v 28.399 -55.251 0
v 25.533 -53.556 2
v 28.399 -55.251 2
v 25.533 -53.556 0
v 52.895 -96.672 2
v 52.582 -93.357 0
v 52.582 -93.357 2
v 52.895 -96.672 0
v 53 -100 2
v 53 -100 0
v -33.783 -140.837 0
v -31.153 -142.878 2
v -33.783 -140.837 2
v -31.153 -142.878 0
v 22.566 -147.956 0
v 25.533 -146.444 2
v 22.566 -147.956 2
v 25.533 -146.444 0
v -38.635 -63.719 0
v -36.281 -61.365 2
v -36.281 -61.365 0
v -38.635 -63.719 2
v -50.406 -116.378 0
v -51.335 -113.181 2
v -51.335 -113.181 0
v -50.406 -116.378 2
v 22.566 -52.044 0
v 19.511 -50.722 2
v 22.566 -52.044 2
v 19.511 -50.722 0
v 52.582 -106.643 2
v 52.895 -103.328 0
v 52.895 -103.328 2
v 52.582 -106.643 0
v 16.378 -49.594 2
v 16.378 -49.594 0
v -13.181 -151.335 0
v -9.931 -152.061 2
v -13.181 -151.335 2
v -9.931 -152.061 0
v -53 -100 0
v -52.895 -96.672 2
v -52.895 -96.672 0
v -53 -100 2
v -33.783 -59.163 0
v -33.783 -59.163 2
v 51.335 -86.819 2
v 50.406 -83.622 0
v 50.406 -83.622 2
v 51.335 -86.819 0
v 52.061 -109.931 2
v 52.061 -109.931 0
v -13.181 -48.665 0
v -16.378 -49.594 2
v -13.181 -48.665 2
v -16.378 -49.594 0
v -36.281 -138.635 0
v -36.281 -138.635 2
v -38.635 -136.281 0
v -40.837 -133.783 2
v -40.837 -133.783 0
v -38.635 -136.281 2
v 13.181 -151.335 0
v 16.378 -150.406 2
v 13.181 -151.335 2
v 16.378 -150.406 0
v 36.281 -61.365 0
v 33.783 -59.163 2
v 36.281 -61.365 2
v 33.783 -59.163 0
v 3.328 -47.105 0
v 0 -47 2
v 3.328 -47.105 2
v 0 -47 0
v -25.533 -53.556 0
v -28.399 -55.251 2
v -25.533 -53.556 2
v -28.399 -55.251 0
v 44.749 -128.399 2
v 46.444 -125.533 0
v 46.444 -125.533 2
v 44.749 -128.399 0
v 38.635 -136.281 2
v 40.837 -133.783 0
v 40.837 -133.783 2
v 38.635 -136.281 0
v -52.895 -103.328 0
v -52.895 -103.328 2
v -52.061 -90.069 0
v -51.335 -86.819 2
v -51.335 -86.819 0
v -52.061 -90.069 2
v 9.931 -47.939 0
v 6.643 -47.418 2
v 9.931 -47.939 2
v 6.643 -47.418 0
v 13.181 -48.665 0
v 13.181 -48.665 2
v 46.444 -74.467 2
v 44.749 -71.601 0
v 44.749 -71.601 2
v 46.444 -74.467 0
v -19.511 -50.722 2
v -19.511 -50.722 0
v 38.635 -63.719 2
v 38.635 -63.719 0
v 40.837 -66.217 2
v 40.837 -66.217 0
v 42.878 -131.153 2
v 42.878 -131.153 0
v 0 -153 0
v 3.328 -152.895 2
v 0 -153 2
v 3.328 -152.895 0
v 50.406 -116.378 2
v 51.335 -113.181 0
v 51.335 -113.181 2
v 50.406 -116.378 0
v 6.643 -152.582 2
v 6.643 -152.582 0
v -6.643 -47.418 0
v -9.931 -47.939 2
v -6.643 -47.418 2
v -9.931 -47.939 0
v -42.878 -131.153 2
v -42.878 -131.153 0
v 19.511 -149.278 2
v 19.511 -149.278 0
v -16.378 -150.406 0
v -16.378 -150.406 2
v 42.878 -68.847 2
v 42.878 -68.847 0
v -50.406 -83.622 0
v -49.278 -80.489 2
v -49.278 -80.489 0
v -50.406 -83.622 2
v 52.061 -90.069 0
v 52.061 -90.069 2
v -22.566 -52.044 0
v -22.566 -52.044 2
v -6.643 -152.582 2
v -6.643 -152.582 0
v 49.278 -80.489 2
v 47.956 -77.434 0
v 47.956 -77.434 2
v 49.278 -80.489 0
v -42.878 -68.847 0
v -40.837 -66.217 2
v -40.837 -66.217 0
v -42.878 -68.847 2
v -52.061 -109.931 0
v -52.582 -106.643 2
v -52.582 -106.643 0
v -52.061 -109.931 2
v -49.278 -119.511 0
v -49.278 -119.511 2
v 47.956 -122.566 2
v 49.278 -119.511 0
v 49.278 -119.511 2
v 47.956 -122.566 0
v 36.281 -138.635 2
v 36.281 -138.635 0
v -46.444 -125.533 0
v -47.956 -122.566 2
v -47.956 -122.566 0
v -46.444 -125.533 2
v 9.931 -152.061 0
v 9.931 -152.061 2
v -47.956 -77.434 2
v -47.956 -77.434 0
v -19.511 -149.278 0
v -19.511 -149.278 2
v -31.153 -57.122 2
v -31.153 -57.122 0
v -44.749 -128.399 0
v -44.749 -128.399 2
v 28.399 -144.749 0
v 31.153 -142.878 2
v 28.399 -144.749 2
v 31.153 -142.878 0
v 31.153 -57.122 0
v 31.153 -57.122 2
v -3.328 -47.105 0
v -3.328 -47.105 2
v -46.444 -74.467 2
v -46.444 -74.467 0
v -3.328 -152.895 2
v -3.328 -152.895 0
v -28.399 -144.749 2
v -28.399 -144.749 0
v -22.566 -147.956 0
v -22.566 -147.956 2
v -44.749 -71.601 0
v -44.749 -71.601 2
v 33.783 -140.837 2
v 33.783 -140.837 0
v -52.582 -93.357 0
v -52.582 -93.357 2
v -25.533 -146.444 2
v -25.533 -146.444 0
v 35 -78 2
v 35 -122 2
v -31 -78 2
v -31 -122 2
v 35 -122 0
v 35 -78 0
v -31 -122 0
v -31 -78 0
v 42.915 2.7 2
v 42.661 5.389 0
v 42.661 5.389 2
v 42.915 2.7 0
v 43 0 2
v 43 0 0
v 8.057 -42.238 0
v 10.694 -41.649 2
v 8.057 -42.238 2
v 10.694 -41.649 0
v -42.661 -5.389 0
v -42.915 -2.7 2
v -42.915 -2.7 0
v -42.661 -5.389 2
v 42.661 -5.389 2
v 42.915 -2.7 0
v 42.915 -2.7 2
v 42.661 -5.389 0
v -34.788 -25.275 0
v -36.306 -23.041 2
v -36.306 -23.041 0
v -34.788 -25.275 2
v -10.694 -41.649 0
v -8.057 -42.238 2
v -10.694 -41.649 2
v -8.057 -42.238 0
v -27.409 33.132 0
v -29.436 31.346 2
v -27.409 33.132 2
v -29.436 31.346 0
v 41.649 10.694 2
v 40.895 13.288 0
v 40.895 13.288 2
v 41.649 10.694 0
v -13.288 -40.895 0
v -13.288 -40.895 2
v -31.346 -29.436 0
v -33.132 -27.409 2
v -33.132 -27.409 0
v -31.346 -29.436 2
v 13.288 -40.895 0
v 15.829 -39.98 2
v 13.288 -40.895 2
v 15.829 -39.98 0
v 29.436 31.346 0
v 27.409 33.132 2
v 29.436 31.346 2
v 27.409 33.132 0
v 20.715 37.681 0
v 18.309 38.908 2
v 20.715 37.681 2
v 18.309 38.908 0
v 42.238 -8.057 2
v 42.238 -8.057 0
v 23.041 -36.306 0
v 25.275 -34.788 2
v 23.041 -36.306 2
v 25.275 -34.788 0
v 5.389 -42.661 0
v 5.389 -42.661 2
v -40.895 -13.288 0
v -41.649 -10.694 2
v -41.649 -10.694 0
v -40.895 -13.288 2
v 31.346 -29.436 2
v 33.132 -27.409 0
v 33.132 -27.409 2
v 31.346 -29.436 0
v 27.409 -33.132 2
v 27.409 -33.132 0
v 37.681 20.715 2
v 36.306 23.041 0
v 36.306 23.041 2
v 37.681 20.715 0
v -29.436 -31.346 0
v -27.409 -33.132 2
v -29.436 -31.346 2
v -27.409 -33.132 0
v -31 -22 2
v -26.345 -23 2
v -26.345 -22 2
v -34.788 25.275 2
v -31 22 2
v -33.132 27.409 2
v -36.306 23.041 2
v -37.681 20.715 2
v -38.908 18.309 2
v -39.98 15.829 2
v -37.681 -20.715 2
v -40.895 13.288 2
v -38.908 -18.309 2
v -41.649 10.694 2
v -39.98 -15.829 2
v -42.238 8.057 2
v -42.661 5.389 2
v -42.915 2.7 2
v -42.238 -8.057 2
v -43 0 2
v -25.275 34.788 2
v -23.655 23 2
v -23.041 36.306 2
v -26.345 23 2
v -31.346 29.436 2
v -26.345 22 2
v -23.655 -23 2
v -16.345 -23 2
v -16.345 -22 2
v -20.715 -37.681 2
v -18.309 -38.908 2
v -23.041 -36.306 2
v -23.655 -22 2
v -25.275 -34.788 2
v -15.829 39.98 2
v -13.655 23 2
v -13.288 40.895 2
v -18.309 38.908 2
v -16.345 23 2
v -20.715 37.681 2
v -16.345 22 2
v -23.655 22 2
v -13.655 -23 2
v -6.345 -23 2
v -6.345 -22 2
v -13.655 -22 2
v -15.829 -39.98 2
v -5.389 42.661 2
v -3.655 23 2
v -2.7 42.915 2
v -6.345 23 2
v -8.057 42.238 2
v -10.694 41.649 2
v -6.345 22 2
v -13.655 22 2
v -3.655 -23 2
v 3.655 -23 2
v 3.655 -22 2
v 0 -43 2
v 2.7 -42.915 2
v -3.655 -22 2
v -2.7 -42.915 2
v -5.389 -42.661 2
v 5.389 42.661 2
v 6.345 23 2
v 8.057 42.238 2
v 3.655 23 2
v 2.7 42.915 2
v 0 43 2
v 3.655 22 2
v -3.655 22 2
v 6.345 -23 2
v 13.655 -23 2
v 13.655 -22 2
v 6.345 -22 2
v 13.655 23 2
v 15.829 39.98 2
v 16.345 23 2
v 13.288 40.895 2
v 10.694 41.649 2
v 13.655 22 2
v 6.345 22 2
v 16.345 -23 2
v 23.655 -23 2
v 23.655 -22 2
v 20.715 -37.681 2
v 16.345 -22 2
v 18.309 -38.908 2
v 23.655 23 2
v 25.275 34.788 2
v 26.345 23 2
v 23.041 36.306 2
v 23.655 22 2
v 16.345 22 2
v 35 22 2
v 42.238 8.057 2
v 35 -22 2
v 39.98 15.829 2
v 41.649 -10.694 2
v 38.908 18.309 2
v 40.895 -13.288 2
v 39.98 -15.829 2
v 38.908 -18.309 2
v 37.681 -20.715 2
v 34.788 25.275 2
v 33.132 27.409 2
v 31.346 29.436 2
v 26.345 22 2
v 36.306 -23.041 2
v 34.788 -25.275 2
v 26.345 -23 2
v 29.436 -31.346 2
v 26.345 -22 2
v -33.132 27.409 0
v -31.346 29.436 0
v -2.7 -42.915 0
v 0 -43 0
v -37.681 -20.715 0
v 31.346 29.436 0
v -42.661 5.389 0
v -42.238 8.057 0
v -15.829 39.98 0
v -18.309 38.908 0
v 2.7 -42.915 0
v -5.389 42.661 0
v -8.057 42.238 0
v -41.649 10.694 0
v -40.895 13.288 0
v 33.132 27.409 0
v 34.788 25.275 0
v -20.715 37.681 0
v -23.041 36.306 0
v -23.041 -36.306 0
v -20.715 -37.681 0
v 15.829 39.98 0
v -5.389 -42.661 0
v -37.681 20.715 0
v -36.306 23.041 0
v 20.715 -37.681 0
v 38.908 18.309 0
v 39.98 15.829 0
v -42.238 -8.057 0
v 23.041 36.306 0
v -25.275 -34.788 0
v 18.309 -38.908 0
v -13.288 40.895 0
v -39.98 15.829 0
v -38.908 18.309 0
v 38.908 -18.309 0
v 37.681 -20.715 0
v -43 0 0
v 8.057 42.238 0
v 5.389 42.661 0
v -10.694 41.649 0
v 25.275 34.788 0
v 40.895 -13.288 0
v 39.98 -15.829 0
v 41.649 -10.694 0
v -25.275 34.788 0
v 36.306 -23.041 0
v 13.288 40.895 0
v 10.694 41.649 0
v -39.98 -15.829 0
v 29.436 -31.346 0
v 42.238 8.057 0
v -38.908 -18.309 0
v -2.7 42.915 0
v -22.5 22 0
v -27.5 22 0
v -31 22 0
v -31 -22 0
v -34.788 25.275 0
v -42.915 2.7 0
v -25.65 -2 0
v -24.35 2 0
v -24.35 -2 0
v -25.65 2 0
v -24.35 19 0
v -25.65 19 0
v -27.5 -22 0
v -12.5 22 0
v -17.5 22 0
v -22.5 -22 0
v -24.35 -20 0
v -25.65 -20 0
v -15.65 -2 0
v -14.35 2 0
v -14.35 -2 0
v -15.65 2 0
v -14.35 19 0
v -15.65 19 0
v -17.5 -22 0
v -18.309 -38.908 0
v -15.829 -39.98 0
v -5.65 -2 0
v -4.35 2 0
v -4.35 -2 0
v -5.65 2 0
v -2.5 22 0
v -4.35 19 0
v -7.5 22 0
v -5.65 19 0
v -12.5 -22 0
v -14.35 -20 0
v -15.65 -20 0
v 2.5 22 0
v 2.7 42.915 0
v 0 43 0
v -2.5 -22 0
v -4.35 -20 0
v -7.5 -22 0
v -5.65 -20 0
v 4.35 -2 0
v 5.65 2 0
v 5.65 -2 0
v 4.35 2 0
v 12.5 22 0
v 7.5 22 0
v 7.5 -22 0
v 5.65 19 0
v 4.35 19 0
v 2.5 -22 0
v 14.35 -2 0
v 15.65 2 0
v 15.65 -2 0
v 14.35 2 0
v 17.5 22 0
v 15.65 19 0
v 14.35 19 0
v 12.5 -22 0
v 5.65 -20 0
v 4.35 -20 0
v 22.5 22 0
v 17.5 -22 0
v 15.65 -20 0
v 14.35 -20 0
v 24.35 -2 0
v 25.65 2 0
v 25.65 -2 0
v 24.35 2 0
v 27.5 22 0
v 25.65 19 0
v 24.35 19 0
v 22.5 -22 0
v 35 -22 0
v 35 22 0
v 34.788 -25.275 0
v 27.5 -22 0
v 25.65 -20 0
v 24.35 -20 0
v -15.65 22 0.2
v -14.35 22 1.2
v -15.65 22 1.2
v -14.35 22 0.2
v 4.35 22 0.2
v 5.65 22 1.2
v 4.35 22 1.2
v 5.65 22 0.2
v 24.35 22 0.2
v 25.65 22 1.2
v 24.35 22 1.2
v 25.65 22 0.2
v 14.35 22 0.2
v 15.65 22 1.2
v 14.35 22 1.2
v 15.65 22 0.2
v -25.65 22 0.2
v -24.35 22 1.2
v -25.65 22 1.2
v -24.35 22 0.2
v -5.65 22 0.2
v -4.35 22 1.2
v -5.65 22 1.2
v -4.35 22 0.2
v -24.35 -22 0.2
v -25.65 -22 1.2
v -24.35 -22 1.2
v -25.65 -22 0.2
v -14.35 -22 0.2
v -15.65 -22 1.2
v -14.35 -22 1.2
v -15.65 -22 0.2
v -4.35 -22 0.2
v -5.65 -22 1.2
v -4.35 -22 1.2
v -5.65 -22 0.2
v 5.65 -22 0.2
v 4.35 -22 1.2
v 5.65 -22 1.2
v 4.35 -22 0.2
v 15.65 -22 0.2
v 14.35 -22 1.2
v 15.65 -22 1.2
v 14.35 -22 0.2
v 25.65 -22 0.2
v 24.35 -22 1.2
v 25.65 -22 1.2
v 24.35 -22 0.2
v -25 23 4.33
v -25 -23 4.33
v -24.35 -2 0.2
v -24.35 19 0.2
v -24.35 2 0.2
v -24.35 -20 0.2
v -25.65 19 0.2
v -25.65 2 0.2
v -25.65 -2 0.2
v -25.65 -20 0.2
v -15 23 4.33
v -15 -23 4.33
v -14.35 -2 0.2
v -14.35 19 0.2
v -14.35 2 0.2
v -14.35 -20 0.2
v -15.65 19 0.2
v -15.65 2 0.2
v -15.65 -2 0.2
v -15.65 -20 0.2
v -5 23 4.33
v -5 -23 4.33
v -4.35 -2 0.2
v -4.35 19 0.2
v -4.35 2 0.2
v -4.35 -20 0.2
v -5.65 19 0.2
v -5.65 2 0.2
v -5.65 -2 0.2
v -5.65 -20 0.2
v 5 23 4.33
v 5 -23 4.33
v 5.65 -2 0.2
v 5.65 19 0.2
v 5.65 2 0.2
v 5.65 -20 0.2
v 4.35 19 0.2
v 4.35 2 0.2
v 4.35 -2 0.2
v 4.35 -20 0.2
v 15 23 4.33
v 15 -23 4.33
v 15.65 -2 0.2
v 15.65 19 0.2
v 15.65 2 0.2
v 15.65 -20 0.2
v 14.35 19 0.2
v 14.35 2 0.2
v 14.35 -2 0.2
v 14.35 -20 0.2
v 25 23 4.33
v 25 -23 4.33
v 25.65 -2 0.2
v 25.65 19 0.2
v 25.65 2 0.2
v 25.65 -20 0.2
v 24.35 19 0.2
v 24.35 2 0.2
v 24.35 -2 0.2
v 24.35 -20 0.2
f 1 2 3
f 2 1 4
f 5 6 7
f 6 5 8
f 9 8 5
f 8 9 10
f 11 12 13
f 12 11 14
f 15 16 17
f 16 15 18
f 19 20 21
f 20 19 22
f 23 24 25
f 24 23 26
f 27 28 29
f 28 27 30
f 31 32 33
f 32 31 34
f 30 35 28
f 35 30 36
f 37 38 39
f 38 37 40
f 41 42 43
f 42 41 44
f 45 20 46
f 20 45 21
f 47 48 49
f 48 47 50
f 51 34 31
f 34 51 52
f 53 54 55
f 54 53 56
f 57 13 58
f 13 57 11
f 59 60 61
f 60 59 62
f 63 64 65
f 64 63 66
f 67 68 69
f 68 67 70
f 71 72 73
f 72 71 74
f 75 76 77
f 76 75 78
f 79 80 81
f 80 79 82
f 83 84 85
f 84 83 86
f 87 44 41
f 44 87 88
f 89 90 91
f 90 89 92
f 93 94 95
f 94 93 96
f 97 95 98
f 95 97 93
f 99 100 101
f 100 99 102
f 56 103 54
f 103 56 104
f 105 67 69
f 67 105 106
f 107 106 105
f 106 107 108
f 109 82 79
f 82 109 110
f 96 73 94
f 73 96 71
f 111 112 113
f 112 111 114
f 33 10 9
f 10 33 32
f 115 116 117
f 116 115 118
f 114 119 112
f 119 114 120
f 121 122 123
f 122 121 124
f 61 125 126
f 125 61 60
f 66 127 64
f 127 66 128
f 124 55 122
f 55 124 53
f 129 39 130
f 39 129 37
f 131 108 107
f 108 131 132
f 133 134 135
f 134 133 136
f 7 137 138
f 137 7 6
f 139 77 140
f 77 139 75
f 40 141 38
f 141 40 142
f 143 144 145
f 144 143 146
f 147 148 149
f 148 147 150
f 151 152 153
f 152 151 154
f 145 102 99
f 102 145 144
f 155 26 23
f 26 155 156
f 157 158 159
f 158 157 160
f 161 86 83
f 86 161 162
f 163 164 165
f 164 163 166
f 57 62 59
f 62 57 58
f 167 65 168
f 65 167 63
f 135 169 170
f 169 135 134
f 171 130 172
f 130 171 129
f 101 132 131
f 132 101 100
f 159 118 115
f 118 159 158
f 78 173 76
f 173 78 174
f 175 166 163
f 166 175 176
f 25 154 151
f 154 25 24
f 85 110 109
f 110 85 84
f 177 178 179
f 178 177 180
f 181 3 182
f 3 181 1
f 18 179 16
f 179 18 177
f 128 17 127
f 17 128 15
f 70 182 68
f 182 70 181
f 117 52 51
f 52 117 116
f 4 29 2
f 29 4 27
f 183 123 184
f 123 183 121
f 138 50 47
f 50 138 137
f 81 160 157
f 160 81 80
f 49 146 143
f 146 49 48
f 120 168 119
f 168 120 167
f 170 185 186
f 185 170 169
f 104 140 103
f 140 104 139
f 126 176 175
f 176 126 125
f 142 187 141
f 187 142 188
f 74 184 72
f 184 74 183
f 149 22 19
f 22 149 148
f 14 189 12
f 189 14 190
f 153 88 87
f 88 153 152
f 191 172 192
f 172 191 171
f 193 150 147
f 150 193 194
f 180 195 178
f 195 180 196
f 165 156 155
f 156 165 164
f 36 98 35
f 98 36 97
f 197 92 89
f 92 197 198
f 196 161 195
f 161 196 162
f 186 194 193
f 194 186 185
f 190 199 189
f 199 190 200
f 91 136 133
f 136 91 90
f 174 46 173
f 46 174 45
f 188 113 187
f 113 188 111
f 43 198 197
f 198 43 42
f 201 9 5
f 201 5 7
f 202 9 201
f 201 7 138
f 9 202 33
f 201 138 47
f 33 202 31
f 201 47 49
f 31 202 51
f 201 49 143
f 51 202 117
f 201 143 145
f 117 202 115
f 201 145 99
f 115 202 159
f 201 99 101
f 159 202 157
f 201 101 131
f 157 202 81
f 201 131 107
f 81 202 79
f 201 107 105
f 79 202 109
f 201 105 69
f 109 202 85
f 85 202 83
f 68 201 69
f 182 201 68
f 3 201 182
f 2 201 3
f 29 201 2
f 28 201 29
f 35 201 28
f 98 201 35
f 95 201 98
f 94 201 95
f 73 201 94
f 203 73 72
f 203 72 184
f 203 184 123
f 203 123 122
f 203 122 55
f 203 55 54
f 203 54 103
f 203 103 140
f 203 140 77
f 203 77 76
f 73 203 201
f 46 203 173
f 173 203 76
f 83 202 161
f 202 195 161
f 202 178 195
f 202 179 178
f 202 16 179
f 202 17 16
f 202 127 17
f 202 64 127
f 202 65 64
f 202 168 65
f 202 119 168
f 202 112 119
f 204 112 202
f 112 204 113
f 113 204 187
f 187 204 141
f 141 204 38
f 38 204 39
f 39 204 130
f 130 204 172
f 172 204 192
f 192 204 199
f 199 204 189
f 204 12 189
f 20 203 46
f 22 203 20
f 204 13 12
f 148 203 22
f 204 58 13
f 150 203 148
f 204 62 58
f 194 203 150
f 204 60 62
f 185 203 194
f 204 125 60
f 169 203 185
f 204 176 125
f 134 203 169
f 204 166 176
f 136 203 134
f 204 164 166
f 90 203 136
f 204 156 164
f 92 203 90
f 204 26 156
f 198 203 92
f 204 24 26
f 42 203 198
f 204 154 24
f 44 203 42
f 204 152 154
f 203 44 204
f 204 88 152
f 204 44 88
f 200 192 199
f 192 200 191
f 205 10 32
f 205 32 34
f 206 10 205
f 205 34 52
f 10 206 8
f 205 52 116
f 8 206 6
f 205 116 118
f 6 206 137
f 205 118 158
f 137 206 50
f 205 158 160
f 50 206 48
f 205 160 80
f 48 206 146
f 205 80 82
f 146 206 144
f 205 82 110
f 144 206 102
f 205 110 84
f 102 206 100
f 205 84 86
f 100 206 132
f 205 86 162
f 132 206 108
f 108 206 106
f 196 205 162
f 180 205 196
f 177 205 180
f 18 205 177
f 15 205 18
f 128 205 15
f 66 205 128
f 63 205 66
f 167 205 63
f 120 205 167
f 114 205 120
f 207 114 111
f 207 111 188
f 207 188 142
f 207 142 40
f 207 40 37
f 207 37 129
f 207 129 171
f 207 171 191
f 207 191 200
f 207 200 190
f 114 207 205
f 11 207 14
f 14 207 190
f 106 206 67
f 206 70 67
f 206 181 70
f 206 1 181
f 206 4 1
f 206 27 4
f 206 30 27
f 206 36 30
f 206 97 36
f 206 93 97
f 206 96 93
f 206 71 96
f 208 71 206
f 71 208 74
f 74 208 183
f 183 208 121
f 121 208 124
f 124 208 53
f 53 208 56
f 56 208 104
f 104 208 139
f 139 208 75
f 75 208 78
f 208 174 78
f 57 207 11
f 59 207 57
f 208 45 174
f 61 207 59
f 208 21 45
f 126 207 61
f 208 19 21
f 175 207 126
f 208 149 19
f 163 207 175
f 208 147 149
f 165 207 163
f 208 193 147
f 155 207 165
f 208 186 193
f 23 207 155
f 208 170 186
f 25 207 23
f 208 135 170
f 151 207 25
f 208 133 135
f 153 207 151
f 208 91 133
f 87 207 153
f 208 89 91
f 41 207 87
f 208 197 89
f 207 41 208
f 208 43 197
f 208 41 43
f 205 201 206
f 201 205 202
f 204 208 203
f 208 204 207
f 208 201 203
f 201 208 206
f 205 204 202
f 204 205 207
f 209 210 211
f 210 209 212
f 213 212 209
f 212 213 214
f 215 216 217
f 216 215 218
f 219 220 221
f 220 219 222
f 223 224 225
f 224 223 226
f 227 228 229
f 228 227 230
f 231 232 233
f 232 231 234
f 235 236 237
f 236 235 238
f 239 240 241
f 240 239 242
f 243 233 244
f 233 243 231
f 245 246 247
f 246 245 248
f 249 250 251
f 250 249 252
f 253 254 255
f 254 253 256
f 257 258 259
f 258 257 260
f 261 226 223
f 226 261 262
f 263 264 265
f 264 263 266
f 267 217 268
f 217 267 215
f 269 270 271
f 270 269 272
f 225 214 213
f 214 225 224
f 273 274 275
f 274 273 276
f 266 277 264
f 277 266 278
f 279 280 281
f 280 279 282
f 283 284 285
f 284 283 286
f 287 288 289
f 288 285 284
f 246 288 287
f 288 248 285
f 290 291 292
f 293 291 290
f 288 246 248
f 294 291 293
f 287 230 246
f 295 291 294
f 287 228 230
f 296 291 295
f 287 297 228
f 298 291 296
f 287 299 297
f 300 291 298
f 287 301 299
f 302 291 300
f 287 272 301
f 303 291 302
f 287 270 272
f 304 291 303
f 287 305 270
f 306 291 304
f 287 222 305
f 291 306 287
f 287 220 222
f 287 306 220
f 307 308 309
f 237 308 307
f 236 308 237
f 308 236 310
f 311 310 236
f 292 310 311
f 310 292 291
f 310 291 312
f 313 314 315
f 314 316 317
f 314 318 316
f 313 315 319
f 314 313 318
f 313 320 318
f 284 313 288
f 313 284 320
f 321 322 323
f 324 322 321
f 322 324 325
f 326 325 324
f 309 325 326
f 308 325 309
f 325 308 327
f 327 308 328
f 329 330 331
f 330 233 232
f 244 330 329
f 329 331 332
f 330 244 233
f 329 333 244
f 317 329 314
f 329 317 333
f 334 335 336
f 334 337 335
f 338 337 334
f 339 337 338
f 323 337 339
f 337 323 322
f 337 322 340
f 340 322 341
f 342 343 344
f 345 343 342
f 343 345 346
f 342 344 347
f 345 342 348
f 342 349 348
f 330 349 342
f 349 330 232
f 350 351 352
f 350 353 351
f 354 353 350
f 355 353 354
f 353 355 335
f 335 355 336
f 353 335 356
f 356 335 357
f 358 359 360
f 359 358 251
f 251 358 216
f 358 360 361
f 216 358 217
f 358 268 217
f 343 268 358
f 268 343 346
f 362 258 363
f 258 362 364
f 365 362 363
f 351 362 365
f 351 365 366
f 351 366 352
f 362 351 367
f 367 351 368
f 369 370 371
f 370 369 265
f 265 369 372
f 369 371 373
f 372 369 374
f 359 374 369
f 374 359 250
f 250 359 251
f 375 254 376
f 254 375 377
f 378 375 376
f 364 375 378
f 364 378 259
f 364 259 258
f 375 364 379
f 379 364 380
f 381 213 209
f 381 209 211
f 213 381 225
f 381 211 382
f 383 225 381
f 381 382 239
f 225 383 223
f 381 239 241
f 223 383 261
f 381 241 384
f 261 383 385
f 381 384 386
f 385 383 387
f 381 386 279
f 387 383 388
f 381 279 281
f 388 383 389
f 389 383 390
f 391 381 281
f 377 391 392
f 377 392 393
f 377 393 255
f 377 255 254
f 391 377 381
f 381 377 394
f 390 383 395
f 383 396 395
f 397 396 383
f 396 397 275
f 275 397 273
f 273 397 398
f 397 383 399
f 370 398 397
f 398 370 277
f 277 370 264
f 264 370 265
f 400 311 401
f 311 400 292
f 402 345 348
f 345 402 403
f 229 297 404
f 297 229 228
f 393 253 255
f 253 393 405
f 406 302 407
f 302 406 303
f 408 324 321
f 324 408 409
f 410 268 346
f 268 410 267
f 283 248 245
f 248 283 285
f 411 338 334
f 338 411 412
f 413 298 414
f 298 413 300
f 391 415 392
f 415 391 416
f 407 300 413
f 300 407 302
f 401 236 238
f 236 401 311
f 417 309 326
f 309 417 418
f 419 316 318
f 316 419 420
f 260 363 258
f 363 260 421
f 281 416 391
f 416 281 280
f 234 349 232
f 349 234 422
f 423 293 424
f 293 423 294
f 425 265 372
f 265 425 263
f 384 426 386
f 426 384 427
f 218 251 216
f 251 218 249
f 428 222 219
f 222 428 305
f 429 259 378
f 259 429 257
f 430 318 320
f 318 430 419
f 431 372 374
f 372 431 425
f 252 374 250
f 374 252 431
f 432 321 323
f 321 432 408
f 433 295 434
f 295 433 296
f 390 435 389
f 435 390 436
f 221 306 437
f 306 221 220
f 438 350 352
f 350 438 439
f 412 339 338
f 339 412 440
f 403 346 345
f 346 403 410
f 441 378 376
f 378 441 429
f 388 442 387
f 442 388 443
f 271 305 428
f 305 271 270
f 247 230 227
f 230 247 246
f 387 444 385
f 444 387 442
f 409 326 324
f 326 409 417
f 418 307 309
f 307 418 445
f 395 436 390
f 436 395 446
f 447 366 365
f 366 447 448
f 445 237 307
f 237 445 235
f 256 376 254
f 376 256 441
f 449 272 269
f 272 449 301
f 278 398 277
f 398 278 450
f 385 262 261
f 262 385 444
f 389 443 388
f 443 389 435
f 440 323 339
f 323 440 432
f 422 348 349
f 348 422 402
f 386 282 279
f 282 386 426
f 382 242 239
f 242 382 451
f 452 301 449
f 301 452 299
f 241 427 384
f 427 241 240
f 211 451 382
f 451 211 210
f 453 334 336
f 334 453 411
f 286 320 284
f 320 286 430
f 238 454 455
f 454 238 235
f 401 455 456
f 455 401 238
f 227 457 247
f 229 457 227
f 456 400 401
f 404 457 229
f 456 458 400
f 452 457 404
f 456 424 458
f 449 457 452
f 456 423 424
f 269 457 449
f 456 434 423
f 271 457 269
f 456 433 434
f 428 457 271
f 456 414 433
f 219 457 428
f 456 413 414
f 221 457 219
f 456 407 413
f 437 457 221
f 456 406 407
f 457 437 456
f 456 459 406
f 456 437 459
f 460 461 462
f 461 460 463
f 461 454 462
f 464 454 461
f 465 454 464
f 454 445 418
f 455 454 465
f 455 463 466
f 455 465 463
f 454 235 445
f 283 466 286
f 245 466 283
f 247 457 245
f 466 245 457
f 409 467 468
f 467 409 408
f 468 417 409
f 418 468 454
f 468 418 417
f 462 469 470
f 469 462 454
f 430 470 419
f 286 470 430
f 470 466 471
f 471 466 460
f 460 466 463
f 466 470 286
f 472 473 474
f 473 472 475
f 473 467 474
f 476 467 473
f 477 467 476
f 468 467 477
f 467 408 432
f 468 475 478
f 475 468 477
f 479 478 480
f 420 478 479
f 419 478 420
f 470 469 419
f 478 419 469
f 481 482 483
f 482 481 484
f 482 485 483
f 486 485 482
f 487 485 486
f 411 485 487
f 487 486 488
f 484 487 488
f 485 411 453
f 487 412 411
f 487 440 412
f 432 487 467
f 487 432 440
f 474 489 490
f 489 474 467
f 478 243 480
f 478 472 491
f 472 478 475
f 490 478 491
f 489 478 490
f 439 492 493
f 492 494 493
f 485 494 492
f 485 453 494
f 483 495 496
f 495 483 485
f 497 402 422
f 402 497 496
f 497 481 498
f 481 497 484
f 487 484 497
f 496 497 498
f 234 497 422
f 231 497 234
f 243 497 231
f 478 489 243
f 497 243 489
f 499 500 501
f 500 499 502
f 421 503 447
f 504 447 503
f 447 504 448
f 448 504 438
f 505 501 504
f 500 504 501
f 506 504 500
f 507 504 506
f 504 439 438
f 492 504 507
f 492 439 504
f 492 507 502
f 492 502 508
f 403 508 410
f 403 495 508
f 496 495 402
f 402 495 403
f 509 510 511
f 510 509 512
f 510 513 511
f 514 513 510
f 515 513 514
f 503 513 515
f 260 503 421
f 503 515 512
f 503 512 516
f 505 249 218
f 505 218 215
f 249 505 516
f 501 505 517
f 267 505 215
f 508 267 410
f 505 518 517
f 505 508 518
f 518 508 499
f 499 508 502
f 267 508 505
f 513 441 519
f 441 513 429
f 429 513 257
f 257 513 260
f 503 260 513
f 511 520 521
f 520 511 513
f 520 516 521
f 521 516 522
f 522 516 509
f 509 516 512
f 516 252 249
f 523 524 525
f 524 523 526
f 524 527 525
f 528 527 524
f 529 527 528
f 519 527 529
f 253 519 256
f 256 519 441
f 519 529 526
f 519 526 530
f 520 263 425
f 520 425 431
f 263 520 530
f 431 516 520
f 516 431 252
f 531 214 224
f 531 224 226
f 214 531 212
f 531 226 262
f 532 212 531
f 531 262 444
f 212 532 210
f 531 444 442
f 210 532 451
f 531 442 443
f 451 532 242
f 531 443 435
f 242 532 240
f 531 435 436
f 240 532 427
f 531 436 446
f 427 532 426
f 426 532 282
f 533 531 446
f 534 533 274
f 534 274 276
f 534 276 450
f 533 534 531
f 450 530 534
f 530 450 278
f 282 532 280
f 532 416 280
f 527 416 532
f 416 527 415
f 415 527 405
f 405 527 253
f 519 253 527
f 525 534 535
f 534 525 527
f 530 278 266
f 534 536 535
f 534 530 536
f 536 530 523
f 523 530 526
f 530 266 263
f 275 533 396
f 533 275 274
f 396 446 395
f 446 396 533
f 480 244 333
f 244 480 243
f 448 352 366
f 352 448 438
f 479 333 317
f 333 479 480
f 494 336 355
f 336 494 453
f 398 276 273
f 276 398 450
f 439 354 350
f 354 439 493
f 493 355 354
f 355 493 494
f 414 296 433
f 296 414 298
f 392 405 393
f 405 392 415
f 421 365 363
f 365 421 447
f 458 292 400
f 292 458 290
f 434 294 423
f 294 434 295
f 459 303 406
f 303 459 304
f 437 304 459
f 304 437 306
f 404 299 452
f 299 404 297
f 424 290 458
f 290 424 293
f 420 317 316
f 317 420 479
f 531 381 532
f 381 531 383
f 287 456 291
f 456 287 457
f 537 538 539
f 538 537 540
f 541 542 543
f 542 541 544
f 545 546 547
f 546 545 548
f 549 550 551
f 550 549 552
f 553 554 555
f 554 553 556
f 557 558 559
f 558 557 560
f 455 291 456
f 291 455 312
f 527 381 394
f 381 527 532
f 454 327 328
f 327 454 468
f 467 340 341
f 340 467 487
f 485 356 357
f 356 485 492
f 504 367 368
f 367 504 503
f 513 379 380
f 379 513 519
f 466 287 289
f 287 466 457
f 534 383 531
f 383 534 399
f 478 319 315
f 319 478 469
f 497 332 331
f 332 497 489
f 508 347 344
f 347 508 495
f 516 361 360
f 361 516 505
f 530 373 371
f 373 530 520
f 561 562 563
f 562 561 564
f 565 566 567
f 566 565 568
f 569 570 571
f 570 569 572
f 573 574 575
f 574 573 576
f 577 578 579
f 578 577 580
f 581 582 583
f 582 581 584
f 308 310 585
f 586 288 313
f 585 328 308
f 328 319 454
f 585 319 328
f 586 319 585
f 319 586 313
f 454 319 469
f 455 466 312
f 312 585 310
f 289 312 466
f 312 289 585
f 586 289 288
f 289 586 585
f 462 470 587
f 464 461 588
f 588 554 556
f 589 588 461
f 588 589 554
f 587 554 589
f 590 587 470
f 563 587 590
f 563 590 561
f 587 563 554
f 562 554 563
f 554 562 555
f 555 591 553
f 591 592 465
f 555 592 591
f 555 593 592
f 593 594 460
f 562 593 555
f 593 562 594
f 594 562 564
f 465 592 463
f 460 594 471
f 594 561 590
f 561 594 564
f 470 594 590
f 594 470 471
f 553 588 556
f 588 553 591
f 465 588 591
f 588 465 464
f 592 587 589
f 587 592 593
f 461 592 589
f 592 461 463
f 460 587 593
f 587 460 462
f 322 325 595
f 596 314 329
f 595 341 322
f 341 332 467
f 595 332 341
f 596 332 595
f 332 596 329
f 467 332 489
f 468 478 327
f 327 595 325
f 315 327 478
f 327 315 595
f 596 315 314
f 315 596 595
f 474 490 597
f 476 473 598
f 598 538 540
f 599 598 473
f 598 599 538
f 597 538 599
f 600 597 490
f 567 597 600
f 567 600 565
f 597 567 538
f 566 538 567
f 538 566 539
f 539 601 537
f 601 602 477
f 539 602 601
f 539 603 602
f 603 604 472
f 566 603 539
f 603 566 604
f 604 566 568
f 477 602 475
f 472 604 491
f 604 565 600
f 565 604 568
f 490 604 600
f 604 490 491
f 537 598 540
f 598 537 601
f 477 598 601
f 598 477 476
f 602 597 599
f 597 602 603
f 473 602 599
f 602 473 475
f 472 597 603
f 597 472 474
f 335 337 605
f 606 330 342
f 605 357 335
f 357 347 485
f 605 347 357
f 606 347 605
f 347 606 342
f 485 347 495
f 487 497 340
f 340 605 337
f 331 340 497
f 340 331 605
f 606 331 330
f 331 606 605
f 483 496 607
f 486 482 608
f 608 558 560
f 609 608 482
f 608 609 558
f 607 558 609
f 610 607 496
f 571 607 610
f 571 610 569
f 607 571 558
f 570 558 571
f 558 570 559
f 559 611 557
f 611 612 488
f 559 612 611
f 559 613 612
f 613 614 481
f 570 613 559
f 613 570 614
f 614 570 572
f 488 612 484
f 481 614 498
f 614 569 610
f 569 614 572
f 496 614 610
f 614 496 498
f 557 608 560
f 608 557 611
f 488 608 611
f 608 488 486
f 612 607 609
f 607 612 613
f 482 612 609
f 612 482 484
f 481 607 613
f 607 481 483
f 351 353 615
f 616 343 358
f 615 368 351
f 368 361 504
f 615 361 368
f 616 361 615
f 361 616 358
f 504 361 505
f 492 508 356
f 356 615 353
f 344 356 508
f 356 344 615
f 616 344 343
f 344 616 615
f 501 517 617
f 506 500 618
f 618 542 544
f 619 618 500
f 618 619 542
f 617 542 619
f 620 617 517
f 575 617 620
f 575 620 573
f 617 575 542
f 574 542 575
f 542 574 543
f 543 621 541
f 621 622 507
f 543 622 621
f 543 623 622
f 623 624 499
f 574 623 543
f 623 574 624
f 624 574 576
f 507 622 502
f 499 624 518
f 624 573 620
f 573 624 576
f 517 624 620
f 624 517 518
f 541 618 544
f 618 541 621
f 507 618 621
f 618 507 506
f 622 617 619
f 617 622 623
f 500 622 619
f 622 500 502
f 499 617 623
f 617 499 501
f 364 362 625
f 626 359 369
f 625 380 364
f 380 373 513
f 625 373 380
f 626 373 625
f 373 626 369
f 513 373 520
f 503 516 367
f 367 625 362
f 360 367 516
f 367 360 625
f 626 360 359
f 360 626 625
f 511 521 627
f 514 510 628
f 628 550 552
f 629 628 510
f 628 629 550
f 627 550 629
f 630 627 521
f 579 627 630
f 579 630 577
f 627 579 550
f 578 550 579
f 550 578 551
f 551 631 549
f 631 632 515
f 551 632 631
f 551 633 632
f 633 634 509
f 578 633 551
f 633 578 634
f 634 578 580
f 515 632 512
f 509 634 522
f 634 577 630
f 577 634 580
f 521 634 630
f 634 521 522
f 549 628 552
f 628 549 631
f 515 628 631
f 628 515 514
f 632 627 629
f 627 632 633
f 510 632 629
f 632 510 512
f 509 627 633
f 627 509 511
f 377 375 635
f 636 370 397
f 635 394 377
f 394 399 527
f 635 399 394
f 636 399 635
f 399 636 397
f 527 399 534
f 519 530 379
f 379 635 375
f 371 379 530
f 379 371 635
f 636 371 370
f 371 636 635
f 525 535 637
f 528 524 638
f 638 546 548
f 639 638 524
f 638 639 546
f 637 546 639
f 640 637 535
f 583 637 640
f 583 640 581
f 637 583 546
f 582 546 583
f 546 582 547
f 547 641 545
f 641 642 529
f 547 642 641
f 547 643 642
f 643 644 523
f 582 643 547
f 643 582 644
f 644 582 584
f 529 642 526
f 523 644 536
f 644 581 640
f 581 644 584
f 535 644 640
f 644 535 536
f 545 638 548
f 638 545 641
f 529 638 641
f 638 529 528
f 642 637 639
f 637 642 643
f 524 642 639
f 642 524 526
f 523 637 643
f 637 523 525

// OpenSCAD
module fazor1piece()
{
	union()
	{
		difference() //upper and lower ring for holding pads
		{
			cylinder(h=3,r=53,$fn=100); //major shape
	
			translate([0,0,-.1]) //move lower ring down
			{
				difference() // get ring rather than circle
				{
					cylinder(h=2.1,r=53.1,$fn=100);
					cylinder(h=2.1,r=43,$fn=100);
				}
			}
			translate([-31,-22,-.1])
			{
				cube([66,44,5.1]);
			}
			translate([-30,-45,-.1])
			{
				rotate([0,0,-60])
				{
					cube([2,12,4]);
				}
			}
		}
		fazorStructure();
	}
}
//fazor1piece();

module fazor2piece()
{
	translate([0,-100,0])
	{
		fazor2pieceTop();
	}
	fazor2pieceBottom();

}
fazor2piece();

module fazor2pieceTop()
{
	difference()
	{
		cylinder(h=2,r=53,$fn=100); //major shape
		translate([-31,-22,-.1])
		{
			cube([66,44,5.1]);
		}
	}
}
//fazor2pieceTop();

module fazor2pieceBottom()
{
	union()
	{
		difference()
		{
			cylinder(h=2,r=43,$fn=100); //major shape
			translate([-31,-22,-.1])
			{
				cube([66,44,5.1]);
			}
		}
		fazorStructure();
		
	}
}
//fazor2pieceBottom();

module fazorBar()
{
	union()
	{
		difference()
		{
			translate([-2.5,23,0])
			{
				rotate([90,0,0])
				{
					equilateralTriangle(side=5,height=46);
				}
			}
			translate([-.65,-24,-.1])
			{
				cube([1.3,48,1.3]);
			}
		}
		translate([-.65,-23,0])
		{
			cube([1.3,3,.2]);
		}
		translate([-.65,19,0])
		{
			cube([1.3,3,.2]);
		}
		translate([-.65,-2,0])
		{
			cube([1.3,4,.2]);
		}
	}

}
//fazorBar();


module fazorStructure()
{
	translate([-25,0,0])
	{
		for(i=[0:5]) //foreach fazor
		{
			translate([10*i,0,0])
			{
				fazorBar();
			}
		}
	}
}
//fazorStructure();













//LIBRARIES
module equilateralTriangle (side=10, height=10, center=false)
{
	translate(center==true ? [-side/2,-sqrt(3)*side/6,-height/2] : [0,0,0])	
		linear_extrude(height=height)
			polygon(points=[[0,0],[side,0],[side/2,sqrt(3)*side/2]]);
}
